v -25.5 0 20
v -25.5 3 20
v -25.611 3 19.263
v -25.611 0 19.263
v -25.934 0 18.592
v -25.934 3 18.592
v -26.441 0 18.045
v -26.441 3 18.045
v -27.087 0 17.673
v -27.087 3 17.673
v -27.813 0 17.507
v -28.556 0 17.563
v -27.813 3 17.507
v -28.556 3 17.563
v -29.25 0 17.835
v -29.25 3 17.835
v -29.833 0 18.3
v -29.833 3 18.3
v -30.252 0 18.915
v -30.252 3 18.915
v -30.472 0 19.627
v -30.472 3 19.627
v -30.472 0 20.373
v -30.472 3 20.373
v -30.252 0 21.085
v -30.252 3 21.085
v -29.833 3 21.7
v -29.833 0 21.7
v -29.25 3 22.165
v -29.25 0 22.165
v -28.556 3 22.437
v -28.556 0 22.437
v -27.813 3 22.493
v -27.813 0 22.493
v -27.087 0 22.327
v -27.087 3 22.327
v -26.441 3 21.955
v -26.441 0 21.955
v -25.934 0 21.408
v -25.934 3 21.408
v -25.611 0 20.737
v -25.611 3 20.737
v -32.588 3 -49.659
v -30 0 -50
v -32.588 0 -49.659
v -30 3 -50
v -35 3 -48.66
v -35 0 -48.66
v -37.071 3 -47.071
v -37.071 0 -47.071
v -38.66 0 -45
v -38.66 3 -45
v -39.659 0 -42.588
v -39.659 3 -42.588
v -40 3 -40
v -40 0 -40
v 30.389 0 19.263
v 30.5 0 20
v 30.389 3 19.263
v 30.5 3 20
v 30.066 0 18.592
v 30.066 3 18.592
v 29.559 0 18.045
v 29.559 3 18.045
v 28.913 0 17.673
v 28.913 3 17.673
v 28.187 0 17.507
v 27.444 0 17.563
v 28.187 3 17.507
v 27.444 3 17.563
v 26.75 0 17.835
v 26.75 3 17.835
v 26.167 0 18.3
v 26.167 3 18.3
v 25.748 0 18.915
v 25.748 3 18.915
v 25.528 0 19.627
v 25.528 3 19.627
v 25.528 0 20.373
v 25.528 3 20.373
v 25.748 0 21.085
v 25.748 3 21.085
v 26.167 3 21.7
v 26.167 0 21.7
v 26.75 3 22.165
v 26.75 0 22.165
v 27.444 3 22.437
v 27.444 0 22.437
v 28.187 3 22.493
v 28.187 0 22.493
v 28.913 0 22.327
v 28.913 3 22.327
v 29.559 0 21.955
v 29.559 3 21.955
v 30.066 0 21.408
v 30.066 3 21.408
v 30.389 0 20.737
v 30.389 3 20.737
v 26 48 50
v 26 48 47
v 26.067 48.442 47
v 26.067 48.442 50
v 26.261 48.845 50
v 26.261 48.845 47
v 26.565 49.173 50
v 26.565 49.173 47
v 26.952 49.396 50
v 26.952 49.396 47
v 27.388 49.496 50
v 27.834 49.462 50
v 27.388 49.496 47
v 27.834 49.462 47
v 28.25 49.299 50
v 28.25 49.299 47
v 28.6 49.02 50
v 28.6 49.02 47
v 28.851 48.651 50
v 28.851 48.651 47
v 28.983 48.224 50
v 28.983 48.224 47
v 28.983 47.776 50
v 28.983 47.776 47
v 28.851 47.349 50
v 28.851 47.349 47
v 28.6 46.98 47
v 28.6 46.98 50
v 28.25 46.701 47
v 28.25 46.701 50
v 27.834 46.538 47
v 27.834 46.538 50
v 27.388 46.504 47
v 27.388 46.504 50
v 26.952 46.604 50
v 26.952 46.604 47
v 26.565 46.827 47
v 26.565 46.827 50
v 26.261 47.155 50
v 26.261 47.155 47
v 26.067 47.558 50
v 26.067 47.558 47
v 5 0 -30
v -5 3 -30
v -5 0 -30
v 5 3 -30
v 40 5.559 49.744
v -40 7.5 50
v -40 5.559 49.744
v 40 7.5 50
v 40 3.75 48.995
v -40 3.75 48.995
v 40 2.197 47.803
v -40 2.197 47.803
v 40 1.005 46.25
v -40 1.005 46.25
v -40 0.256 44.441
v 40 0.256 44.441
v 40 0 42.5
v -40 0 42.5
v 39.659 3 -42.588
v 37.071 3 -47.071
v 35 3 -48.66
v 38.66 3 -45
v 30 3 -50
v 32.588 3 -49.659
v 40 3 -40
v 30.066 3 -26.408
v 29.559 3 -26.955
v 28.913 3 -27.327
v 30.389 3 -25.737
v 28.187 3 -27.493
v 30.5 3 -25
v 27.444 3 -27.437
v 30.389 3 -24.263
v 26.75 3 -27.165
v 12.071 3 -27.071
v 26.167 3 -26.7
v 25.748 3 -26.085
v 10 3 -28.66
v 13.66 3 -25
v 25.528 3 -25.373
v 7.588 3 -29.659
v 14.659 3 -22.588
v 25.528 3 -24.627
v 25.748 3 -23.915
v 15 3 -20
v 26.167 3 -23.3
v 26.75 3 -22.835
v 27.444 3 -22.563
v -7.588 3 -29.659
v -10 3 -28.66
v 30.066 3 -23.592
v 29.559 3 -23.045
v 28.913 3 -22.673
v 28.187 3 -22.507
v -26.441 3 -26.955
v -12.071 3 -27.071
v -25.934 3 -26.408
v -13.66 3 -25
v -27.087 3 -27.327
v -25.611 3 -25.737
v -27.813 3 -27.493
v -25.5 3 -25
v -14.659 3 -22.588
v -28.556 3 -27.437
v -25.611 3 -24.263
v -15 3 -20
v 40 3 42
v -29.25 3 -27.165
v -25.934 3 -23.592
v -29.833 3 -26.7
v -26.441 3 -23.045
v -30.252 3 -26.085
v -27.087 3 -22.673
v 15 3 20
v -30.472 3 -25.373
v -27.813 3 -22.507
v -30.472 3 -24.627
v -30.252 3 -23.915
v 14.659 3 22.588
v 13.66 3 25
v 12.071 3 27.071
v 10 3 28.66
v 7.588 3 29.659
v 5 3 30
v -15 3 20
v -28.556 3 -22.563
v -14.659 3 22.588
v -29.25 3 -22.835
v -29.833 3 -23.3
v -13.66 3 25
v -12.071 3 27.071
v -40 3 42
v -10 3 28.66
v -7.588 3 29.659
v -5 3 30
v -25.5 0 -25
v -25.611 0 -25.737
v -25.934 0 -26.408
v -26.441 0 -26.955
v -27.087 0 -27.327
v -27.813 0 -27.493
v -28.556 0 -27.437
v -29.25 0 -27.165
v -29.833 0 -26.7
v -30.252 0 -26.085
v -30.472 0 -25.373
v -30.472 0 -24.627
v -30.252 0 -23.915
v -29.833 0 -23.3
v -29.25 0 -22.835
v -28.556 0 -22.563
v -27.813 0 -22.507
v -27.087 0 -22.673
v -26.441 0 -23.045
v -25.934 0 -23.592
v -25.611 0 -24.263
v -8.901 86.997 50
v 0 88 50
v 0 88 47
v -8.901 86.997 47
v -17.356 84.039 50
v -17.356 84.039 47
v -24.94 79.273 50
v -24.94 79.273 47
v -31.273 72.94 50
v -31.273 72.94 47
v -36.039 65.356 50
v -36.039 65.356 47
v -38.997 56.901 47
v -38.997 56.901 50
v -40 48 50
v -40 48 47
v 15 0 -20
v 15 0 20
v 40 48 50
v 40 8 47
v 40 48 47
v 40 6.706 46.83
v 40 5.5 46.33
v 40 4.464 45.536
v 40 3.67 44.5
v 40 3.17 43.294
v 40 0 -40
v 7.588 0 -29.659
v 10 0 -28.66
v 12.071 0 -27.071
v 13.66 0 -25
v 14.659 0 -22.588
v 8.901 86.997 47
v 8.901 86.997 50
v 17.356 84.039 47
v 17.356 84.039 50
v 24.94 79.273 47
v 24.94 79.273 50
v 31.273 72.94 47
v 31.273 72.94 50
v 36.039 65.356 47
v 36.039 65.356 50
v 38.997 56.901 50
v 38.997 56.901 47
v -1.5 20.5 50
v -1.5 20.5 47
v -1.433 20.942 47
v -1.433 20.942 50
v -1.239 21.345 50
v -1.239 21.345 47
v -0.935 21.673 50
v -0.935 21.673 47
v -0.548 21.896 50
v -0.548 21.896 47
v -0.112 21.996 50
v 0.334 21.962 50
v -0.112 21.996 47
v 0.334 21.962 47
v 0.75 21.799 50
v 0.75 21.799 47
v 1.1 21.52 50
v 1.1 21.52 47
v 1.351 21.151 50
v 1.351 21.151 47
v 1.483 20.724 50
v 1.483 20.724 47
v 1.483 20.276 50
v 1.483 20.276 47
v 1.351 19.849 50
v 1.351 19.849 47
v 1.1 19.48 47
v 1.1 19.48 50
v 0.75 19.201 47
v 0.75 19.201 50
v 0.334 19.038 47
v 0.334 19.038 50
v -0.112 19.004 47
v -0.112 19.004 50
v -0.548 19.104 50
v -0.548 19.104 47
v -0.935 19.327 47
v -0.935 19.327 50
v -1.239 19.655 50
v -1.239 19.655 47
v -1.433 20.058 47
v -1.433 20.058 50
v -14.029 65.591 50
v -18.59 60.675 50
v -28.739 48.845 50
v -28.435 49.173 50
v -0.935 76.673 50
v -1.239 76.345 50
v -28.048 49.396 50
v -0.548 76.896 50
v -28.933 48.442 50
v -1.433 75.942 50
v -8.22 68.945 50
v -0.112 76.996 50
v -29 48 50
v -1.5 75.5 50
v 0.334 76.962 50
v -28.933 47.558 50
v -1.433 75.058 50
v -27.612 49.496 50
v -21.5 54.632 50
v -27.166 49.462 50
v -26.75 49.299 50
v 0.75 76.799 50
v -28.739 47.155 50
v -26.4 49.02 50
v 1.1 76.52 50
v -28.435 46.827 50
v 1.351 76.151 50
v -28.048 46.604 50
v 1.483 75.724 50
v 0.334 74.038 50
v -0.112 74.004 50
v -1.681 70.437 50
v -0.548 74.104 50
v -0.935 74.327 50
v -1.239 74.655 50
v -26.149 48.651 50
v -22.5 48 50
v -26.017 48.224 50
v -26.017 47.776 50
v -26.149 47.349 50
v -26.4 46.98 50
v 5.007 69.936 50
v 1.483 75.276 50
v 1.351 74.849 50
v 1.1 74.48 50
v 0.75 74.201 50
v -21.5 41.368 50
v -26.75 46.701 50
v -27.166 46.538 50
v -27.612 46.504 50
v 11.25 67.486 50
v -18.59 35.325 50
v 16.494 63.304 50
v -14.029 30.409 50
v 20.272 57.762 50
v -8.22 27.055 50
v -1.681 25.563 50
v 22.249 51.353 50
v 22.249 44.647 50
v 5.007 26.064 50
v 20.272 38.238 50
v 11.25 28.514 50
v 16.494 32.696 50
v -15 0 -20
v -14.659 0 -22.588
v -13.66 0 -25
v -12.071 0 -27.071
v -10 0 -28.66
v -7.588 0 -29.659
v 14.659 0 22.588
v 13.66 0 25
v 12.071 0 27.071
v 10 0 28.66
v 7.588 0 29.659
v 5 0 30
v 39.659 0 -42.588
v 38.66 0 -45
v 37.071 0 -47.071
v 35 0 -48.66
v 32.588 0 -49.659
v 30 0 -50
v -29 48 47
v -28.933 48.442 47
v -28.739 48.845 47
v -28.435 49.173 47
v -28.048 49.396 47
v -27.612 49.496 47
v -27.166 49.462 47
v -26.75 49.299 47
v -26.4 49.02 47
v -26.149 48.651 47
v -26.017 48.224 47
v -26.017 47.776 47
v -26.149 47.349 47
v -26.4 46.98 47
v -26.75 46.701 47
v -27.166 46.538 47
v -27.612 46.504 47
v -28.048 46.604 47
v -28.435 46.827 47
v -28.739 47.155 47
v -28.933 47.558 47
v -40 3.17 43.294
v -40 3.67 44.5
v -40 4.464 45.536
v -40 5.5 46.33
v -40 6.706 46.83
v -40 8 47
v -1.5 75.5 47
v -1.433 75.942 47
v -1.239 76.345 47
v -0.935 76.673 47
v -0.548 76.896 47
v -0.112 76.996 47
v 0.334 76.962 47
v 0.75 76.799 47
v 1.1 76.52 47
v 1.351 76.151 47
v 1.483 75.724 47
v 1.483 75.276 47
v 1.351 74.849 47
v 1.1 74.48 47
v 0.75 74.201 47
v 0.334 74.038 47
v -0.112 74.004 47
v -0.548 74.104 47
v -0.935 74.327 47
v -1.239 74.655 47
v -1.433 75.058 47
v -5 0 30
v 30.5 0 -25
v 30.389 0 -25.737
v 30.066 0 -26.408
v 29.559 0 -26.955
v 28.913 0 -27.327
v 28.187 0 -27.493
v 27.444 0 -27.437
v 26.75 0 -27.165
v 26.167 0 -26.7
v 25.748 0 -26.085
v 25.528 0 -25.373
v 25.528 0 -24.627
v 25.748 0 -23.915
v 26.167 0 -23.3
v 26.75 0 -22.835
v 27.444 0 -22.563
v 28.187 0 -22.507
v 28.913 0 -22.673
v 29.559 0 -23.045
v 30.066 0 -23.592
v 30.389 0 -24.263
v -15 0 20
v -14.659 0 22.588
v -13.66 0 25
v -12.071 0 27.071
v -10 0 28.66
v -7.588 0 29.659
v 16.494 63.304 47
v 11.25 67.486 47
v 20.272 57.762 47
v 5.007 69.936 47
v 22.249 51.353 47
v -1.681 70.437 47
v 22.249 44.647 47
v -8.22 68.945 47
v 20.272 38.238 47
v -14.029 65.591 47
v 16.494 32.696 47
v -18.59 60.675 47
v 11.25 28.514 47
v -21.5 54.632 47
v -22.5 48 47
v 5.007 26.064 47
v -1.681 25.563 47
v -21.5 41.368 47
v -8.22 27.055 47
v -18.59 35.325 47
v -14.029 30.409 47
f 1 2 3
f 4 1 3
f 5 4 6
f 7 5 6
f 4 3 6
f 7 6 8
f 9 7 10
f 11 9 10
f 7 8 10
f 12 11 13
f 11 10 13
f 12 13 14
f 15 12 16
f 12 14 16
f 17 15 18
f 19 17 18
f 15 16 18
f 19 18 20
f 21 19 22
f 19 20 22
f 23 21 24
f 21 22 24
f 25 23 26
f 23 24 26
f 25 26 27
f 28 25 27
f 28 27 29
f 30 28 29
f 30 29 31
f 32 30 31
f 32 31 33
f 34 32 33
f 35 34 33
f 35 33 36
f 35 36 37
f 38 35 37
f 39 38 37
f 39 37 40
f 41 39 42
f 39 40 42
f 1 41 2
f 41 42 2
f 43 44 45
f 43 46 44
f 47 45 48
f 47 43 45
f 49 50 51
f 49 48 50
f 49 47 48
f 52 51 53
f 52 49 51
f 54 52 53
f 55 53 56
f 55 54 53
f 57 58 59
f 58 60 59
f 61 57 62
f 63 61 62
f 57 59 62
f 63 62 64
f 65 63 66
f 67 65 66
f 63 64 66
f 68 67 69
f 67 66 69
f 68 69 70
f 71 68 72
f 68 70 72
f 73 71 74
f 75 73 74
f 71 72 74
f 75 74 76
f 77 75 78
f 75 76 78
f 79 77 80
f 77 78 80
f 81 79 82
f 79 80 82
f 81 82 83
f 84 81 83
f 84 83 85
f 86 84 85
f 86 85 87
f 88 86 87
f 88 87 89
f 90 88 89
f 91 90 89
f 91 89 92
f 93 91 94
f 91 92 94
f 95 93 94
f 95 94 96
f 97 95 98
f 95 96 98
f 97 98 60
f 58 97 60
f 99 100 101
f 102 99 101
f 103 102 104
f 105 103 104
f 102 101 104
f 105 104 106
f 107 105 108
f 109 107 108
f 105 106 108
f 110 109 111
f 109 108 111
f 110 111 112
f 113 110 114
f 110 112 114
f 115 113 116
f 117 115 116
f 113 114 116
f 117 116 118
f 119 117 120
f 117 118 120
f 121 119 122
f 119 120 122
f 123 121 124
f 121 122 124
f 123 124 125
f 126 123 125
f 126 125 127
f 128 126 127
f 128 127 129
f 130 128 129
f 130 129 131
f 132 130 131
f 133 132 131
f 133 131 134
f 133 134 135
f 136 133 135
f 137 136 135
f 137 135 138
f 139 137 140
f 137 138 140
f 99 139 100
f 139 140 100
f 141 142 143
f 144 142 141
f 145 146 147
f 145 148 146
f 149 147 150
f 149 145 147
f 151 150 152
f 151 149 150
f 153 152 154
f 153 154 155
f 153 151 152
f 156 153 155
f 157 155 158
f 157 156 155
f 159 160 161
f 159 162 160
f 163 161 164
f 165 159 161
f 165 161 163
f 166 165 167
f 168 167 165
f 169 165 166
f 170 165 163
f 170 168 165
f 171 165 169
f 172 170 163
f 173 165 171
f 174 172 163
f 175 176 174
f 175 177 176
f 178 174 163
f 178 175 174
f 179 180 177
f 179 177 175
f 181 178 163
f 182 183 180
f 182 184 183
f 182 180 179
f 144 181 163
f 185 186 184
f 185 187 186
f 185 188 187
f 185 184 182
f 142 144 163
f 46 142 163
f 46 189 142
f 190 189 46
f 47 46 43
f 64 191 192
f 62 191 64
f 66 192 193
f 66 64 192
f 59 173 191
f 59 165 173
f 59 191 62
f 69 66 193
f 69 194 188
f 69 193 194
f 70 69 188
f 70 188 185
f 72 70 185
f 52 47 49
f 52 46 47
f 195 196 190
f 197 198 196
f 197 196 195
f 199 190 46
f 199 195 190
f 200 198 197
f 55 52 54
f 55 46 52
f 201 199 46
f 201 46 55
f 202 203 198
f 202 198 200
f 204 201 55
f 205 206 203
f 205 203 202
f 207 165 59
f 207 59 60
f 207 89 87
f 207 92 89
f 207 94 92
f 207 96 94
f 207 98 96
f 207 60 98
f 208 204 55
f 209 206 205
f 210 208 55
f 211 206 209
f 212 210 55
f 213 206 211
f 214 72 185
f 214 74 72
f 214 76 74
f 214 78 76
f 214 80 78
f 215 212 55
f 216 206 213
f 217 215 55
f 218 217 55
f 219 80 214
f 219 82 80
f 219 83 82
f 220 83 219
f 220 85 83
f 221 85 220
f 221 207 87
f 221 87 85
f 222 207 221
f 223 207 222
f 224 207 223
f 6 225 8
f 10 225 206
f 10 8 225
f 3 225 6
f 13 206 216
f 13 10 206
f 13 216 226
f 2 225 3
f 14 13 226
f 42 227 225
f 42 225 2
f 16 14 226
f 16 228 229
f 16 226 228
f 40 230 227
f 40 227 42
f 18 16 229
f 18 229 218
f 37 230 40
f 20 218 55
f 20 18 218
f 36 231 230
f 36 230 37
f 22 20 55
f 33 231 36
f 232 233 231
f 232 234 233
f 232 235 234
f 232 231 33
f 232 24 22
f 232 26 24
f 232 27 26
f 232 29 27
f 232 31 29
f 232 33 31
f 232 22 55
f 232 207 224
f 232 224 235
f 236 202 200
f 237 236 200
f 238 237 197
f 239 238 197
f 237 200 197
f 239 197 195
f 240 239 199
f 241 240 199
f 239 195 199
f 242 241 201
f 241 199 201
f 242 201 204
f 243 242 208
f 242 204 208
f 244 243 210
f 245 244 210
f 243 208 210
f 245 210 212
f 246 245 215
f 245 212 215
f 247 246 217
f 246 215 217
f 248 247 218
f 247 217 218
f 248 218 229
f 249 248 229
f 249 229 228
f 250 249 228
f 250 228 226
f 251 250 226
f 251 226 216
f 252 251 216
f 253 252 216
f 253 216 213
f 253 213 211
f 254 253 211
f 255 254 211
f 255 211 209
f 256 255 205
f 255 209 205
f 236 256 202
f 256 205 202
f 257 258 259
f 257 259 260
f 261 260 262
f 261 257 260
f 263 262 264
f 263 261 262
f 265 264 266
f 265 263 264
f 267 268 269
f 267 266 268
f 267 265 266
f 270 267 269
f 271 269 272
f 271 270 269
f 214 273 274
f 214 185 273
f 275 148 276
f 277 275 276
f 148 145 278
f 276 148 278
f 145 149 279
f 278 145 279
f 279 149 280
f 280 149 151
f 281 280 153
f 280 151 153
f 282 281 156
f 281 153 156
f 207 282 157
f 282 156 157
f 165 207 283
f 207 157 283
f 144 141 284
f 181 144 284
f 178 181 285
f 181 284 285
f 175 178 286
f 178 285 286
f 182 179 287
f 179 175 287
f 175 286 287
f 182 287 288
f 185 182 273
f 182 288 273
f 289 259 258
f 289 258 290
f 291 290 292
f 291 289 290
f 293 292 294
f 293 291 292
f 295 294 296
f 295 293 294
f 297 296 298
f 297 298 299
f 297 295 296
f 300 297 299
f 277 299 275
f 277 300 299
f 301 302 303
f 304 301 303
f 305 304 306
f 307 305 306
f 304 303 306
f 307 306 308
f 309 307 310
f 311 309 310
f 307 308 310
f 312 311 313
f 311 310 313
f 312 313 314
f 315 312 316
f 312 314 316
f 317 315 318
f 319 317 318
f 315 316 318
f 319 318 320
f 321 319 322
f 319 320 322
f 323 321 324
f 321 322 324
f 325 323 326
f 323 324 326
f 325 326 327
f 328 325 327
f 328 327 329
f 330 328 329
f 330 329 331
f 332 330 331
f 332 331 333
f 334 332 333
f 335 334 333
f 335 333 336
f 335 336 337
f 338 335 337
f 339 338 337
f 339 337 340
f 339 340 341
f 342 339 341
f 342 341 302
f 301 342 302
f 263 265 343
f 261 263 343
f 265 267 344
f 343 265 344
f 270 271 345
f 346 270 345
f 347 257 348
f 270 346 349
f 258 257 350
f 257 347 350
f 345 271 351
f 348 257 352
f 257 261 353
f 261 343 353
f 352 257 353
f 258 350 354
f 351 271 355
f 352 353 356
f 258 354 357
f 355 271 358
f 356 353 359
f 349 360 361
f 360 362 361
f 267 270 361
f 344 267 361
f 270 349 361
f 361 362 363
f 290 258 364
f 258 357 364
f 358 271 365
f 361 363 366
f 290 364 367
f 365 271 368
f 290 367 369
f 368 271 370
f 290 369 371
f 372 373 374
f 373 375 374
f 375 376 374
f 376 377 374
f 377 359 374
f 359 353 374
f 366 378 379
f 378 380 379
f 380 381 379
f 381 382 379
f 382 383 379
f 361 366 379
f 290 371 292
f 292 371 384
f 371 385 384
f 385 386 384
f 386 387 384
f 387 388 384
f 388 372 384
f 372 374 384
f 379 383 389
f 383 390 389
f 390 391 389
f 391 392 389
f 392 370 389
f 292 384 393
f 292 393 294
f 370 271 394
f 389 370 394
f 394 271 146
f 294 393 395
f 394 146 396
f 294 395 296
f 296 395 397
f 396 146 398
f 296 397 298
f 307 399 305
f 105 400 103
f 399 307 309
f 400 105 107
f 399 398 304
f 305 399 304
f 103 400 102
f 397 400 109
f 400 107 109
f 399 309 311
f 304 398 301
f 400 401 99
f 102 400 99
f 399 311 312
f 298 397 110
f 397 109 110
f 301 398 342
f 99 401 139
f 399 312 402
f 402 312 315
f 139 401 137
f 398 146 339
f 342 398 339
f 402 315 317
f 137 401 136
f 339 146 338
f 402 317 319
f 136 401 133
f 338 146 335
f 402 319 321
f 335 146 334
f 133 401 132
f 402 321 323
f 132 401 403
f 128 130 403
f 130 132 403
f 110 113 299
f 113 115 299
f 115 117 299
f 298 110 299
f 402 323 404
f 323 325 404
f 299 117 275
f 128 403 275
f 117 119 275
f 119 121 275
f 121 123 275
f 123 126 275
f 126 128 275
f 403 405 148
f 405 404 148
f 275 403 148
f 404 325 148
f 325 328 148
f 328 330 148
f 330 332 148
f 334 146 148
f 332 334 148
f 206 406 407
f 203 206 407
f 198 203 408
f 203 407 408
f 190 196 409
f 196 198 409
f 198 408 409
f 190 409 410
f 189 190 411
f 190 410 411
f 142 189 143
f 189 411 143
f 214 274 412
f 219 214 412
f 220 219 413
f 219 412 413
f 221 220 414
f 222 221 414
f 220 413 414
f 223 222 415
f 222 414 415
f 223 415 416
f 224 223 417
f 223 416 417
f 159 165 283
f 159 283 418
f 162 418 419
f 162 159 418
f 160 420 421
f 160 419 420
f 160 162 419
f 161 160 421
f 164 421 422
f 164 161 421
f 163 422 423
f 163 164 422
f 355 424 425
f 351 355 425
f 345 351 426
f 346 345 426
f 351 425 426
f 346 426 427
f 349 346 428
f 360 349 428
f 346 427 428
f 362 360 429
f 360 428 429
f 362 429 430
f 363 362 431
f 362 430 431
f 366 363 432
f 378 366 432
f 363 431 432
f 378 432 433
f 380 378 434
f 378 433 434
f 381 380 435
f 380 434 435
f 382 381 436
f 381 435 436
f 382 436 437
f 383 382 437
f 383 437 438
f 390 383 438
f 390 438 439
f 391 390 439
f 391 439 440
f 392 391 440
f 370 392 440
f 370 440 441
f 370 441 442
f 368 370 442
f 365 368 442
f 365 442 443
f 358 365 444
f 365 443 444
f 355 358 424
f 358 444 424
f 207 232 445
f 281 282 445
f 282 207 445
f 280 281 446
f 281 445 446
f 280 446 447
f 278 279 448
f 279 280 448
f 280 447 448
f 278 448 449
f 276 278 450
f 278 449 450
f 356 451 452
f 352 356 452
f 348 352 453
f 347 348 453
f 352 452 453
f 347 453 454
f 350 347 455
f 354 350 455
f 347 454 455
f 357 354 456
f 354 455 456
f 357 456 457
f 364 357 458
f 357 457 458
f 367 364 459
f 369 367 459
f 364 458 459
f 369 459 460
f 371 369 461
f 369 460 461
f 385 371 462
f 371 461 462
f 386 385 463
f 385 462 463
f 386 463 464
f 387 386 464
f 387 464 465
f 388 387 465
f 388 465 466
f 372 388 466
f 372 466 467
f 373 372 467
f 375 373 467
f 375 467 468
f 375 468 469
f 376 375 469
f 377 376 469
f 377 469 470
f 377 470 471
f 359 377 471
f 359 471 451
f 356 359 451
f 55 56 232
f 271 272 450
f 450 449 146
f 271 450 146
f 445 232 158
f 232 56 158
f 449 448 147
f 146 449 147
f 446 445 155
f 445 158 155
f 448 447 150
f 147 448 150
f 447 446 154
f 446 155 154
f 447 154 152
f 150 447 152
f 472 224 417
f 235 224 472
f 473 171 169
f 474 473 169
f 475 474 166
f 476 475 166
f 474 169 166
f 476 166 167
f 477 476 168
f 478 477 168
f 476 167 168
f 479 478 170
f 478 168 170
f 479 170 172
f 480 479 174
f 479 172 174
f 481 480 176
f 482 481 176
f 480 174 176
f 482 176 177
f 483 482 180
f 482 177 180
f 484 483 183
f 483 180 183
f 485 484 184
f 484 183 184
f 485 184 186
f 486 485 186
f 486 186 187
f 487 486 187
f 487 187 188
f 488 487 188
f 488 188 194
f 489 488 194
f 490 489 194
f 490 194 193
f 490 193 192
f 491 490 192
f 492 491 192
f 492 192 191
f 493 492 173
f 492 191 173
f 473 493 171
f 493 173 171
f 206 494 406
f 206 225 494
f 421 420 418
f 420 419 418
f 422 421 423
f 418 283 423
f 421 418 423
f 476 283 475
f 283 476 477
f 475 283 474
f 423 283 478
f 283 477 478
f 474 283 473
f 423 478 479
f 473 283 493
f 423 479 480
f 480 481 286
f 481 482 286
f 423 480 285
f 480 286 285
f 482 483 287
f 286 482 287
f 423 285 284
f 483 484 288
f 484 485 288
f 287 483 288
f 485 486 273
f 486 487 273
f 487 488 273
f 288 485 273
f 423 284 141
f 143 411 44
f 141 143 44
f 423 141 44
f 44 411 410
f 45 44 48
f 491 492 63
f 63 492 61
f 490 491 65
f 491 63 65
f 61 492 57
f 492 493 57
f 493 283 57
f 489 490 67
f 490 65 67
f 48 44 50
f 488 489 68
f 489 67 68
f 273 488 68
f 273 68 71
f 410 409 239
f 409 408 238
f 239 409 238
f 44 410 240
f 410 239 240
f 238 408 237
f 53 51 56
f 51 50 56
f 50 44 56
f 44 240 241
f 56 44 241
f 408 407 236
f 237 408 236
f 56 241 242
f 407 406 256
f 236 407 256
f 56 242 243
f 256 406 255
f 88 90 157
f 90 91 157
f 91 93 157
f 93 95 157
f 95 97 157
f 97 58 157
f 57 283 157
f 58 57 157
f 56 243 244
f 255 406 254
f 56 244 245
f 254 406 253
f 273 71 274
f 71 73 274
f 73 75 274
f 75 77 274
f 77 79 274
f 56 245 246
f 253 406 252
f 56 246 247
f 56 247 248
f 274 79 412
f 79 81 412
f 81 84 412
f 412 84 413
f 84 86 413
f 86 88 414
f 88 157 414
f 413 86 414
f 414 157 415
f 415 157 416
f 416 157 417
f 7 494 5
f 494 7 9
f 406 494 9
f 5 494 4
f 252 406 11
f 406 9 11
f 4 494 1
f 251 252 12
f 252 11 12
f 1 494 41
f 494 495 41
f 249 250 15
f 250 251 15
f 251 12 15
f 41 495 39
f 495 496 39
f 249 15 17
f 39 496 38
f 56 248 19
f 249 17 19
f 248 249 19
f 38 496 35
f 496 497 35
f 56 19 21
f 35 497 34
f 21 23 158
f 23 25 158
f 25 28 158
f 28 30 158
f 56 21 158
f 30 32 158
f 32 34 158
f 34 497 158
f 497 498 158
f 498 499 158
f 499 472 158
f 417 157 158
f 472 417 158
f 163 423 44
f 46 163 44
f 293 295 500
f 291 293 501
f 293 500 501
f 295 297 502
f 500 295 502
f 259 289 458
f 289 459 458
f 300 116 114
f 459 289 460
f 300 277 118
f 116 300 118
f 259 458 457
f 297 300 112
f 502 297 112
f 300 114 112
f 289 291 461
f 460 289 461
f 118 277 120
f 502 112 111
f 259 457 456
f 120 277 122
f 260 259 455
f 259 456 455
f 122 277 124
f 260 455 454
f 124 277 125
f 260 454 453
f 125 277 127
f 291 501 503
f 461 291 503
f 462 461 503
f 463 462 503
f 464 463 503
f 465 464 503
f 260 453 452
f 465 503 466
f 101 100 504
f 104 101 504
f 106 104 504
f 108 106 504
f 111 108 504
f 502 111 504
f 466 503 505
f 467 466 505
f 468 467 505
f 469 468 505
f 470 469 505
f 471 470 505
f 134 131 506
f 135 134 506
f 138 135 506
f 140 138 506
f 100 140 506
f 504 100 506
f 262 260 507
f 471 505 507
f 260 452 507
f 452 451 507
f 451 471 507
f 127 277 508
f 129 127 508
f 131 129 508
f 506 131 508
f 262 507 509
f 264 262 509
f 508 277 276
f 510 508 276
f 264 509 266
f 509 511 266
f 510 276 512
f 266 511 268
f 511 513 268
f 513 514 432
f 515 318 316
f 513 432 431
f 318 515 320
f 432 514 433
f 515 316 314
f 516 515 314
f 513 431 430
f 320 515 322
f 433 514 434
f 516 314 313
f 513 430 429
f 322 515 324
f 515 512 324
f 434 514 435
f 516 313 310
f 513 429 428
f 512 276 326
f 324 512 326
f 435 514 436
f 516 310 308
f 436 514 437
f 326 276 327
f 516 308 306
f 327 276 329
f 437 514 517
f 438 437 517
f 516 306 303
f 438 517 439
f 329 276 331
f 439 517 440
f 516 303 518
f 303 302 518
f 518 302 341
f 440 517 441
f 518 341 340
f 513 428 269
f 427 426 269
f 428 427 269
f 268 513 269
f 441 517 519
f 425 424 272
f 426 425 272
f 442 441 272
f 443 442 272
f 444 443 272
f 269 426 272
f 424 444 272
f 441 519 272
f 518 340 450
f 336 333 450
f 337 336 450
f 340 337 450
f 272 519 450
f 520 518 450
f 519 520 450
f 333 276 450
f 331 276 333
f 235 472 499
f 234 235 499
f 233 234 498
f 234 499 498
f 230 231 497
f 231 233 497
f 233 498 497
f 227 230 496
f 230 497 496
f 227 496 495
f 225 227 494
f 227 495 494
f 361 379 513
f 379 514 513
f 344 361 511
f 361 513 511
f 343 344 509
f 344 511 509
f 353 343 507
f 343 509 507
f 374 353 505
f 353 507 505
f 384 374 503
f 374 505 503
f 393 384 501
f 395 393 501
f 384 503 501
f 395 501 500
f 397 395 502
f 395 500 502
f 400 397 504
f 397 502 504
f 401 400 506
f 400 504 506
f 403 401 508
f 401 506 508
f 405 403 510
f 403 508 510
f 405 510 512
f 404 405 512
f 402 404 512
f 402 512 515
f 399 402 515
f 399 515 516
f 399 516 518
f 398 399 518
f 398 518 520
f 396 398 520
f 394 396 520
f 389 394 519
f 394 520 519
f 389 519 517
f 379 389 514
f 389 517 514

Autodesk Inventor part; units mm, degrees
ref_plane "YZ Plane" through (0, 0, 0) normal (1, 0, 0) x (0, 1, 0)
ref_plane "XZ Plane" through (0, 0, 0) normal (0, 1, 0) x (-1, 0, 0)
ref_plane "XY Plane" through (0, 0, 0) normal (0, 0, 1) x (1, 0, 0)
sketch "Sketch1" plane through (0, 0, 0) normal (0, 1, 0) x (-1, 0, 0)
  line L0 (40, 50) -> (-40, 50)
  line L1 (-40, 50) -> (-40, -50)
  line L2 (-40, -50) -> (40, -50)
  line L3 (40, -50) -> (40, 50)
  line L4 (40, 50) -> (-40, -50) construction
  line L5 (-40, 50) -> (40, -50) construction
  point P0 (0, 0)
  dimension "d0" = 80
  dimension "d1" = 100
extrude "Extrusion1" add sketch "Sketch1" along normal blind 3
sketch "Sketch2" plane through (0, 3, 0) normal (0, 1, 0) x (1, 0, 0)
  line L0 (-40, 50) -> (-40, -50) projected
  line L1 (40, -50) -> (40, 50) projected
  line L2 (-40, -50) -> (40, -50)
  line L3 (40, -50) -> (40, -47)
  line L4 (40, -47) -> (-40, -47)
  line L5 (-40, -47) -> (-40, -50)
  point P0 (0, 0)
  dimension "d4" = 3
extrude "Extrusion2" add sketch "Sketch2" along normal blind 85
sketch "Sketch4" plane through (40, 3, 47) normal (0, 0, -1) x (-1, 0, 0)
  circle A0 centre (40, 45) radius 22.5
  line L0 (0, 0) -> (80, 0) projected
  line L1 (0, 0) -> (0, 85) projected
  circle A1 centre (12.5, 45) radius 1.5
  circle A2 centre (40, 72.5) radius 1.5
  circle A3 centre (67.5, 45) radius 1.5
  circle A4 centre (40, 17.5) radius 1.5
  line L2 (0, 85) -> (80, 85) projected
  point P0 (40, -3)
  dimension "d7" = 45
  dimension "d9" = 40
  dimension "d10" = 3
  dimension "d11" = 3
  dimension "d12" = 3
  dimension "d13" = 3
  dimension "d14" = 27.5
  dimension "d15" = 27.5
  dimension "d16" = 27.5
  dimension "d17" = 27.5
  dimension "d21" = 40
extrude "Extrusion3" cut sketch "Sketch4" against normal blind 3
fillet "Fillet1" radius 40 2 edges at (40, 88, 48.5) (-40, 88, 48.5)
fillet "Fillet2" radius 5 1 edges at (0, 3, 47)
fillet "Fillet3" radius 7.5 1 edges at (0, 0, 50)
fillet "Fillet4" radius 10 2 edges at (40, 1.5, -50) (-40, 1.5, -50)
sketch "Sketch7" plane through (0, 3, 0) normal (0, 1, 0) x (1, 0, 0)
  circle A0 centre (28, -20) radius 2.5
  circle A1 centre (28, 25) radius 2.5
  circle A2 centre (-28, 25) radius 2.5
  circle A3 centre (-28, -20) radius 2.5
  line L0 (40, -42) -> (40, 40) projected
  line L1 (30, 50) -> (-30, 50) projected
  line L2 (-40, 40) -> (-40, -42) projected
  line L3 (15, -30) -> (-15, -30)
  line L4 (-15, -30) -> (-15, 30)
  line L5 (-15, 30) -> (15, 30)
  line L6 (15, 30) -> (15, -30)
  line L7 (15, -30) -> (-15, 30) construction
  line L8 (-15, -30) -> (15, 30) construction
  point P0 (0, 0)
  dimension "d25" = 5
  dimension "d26" = 5
  dimension "d27" = 5
  dimension "d28" = 5
  dimension "d29" = 12
  dimension "d30" = 70
  dimension "d31" = 25
  dimension "d32" = 12
  dimension "d33" = 70
  dimension "d34" = 25
  dimension "d35" = 30
  dimension "d36" = 60
extrude "Extrusion4" cut sketch "Sketch7" against normal blind 85
fillet "Fillet5" radius 10 4 edges at (-15, 1.5, 30) (15, 1.5, 30) (15, 1.5, -30) (-15, 1.5, -30)
properties part number "Holder Water Pump"
